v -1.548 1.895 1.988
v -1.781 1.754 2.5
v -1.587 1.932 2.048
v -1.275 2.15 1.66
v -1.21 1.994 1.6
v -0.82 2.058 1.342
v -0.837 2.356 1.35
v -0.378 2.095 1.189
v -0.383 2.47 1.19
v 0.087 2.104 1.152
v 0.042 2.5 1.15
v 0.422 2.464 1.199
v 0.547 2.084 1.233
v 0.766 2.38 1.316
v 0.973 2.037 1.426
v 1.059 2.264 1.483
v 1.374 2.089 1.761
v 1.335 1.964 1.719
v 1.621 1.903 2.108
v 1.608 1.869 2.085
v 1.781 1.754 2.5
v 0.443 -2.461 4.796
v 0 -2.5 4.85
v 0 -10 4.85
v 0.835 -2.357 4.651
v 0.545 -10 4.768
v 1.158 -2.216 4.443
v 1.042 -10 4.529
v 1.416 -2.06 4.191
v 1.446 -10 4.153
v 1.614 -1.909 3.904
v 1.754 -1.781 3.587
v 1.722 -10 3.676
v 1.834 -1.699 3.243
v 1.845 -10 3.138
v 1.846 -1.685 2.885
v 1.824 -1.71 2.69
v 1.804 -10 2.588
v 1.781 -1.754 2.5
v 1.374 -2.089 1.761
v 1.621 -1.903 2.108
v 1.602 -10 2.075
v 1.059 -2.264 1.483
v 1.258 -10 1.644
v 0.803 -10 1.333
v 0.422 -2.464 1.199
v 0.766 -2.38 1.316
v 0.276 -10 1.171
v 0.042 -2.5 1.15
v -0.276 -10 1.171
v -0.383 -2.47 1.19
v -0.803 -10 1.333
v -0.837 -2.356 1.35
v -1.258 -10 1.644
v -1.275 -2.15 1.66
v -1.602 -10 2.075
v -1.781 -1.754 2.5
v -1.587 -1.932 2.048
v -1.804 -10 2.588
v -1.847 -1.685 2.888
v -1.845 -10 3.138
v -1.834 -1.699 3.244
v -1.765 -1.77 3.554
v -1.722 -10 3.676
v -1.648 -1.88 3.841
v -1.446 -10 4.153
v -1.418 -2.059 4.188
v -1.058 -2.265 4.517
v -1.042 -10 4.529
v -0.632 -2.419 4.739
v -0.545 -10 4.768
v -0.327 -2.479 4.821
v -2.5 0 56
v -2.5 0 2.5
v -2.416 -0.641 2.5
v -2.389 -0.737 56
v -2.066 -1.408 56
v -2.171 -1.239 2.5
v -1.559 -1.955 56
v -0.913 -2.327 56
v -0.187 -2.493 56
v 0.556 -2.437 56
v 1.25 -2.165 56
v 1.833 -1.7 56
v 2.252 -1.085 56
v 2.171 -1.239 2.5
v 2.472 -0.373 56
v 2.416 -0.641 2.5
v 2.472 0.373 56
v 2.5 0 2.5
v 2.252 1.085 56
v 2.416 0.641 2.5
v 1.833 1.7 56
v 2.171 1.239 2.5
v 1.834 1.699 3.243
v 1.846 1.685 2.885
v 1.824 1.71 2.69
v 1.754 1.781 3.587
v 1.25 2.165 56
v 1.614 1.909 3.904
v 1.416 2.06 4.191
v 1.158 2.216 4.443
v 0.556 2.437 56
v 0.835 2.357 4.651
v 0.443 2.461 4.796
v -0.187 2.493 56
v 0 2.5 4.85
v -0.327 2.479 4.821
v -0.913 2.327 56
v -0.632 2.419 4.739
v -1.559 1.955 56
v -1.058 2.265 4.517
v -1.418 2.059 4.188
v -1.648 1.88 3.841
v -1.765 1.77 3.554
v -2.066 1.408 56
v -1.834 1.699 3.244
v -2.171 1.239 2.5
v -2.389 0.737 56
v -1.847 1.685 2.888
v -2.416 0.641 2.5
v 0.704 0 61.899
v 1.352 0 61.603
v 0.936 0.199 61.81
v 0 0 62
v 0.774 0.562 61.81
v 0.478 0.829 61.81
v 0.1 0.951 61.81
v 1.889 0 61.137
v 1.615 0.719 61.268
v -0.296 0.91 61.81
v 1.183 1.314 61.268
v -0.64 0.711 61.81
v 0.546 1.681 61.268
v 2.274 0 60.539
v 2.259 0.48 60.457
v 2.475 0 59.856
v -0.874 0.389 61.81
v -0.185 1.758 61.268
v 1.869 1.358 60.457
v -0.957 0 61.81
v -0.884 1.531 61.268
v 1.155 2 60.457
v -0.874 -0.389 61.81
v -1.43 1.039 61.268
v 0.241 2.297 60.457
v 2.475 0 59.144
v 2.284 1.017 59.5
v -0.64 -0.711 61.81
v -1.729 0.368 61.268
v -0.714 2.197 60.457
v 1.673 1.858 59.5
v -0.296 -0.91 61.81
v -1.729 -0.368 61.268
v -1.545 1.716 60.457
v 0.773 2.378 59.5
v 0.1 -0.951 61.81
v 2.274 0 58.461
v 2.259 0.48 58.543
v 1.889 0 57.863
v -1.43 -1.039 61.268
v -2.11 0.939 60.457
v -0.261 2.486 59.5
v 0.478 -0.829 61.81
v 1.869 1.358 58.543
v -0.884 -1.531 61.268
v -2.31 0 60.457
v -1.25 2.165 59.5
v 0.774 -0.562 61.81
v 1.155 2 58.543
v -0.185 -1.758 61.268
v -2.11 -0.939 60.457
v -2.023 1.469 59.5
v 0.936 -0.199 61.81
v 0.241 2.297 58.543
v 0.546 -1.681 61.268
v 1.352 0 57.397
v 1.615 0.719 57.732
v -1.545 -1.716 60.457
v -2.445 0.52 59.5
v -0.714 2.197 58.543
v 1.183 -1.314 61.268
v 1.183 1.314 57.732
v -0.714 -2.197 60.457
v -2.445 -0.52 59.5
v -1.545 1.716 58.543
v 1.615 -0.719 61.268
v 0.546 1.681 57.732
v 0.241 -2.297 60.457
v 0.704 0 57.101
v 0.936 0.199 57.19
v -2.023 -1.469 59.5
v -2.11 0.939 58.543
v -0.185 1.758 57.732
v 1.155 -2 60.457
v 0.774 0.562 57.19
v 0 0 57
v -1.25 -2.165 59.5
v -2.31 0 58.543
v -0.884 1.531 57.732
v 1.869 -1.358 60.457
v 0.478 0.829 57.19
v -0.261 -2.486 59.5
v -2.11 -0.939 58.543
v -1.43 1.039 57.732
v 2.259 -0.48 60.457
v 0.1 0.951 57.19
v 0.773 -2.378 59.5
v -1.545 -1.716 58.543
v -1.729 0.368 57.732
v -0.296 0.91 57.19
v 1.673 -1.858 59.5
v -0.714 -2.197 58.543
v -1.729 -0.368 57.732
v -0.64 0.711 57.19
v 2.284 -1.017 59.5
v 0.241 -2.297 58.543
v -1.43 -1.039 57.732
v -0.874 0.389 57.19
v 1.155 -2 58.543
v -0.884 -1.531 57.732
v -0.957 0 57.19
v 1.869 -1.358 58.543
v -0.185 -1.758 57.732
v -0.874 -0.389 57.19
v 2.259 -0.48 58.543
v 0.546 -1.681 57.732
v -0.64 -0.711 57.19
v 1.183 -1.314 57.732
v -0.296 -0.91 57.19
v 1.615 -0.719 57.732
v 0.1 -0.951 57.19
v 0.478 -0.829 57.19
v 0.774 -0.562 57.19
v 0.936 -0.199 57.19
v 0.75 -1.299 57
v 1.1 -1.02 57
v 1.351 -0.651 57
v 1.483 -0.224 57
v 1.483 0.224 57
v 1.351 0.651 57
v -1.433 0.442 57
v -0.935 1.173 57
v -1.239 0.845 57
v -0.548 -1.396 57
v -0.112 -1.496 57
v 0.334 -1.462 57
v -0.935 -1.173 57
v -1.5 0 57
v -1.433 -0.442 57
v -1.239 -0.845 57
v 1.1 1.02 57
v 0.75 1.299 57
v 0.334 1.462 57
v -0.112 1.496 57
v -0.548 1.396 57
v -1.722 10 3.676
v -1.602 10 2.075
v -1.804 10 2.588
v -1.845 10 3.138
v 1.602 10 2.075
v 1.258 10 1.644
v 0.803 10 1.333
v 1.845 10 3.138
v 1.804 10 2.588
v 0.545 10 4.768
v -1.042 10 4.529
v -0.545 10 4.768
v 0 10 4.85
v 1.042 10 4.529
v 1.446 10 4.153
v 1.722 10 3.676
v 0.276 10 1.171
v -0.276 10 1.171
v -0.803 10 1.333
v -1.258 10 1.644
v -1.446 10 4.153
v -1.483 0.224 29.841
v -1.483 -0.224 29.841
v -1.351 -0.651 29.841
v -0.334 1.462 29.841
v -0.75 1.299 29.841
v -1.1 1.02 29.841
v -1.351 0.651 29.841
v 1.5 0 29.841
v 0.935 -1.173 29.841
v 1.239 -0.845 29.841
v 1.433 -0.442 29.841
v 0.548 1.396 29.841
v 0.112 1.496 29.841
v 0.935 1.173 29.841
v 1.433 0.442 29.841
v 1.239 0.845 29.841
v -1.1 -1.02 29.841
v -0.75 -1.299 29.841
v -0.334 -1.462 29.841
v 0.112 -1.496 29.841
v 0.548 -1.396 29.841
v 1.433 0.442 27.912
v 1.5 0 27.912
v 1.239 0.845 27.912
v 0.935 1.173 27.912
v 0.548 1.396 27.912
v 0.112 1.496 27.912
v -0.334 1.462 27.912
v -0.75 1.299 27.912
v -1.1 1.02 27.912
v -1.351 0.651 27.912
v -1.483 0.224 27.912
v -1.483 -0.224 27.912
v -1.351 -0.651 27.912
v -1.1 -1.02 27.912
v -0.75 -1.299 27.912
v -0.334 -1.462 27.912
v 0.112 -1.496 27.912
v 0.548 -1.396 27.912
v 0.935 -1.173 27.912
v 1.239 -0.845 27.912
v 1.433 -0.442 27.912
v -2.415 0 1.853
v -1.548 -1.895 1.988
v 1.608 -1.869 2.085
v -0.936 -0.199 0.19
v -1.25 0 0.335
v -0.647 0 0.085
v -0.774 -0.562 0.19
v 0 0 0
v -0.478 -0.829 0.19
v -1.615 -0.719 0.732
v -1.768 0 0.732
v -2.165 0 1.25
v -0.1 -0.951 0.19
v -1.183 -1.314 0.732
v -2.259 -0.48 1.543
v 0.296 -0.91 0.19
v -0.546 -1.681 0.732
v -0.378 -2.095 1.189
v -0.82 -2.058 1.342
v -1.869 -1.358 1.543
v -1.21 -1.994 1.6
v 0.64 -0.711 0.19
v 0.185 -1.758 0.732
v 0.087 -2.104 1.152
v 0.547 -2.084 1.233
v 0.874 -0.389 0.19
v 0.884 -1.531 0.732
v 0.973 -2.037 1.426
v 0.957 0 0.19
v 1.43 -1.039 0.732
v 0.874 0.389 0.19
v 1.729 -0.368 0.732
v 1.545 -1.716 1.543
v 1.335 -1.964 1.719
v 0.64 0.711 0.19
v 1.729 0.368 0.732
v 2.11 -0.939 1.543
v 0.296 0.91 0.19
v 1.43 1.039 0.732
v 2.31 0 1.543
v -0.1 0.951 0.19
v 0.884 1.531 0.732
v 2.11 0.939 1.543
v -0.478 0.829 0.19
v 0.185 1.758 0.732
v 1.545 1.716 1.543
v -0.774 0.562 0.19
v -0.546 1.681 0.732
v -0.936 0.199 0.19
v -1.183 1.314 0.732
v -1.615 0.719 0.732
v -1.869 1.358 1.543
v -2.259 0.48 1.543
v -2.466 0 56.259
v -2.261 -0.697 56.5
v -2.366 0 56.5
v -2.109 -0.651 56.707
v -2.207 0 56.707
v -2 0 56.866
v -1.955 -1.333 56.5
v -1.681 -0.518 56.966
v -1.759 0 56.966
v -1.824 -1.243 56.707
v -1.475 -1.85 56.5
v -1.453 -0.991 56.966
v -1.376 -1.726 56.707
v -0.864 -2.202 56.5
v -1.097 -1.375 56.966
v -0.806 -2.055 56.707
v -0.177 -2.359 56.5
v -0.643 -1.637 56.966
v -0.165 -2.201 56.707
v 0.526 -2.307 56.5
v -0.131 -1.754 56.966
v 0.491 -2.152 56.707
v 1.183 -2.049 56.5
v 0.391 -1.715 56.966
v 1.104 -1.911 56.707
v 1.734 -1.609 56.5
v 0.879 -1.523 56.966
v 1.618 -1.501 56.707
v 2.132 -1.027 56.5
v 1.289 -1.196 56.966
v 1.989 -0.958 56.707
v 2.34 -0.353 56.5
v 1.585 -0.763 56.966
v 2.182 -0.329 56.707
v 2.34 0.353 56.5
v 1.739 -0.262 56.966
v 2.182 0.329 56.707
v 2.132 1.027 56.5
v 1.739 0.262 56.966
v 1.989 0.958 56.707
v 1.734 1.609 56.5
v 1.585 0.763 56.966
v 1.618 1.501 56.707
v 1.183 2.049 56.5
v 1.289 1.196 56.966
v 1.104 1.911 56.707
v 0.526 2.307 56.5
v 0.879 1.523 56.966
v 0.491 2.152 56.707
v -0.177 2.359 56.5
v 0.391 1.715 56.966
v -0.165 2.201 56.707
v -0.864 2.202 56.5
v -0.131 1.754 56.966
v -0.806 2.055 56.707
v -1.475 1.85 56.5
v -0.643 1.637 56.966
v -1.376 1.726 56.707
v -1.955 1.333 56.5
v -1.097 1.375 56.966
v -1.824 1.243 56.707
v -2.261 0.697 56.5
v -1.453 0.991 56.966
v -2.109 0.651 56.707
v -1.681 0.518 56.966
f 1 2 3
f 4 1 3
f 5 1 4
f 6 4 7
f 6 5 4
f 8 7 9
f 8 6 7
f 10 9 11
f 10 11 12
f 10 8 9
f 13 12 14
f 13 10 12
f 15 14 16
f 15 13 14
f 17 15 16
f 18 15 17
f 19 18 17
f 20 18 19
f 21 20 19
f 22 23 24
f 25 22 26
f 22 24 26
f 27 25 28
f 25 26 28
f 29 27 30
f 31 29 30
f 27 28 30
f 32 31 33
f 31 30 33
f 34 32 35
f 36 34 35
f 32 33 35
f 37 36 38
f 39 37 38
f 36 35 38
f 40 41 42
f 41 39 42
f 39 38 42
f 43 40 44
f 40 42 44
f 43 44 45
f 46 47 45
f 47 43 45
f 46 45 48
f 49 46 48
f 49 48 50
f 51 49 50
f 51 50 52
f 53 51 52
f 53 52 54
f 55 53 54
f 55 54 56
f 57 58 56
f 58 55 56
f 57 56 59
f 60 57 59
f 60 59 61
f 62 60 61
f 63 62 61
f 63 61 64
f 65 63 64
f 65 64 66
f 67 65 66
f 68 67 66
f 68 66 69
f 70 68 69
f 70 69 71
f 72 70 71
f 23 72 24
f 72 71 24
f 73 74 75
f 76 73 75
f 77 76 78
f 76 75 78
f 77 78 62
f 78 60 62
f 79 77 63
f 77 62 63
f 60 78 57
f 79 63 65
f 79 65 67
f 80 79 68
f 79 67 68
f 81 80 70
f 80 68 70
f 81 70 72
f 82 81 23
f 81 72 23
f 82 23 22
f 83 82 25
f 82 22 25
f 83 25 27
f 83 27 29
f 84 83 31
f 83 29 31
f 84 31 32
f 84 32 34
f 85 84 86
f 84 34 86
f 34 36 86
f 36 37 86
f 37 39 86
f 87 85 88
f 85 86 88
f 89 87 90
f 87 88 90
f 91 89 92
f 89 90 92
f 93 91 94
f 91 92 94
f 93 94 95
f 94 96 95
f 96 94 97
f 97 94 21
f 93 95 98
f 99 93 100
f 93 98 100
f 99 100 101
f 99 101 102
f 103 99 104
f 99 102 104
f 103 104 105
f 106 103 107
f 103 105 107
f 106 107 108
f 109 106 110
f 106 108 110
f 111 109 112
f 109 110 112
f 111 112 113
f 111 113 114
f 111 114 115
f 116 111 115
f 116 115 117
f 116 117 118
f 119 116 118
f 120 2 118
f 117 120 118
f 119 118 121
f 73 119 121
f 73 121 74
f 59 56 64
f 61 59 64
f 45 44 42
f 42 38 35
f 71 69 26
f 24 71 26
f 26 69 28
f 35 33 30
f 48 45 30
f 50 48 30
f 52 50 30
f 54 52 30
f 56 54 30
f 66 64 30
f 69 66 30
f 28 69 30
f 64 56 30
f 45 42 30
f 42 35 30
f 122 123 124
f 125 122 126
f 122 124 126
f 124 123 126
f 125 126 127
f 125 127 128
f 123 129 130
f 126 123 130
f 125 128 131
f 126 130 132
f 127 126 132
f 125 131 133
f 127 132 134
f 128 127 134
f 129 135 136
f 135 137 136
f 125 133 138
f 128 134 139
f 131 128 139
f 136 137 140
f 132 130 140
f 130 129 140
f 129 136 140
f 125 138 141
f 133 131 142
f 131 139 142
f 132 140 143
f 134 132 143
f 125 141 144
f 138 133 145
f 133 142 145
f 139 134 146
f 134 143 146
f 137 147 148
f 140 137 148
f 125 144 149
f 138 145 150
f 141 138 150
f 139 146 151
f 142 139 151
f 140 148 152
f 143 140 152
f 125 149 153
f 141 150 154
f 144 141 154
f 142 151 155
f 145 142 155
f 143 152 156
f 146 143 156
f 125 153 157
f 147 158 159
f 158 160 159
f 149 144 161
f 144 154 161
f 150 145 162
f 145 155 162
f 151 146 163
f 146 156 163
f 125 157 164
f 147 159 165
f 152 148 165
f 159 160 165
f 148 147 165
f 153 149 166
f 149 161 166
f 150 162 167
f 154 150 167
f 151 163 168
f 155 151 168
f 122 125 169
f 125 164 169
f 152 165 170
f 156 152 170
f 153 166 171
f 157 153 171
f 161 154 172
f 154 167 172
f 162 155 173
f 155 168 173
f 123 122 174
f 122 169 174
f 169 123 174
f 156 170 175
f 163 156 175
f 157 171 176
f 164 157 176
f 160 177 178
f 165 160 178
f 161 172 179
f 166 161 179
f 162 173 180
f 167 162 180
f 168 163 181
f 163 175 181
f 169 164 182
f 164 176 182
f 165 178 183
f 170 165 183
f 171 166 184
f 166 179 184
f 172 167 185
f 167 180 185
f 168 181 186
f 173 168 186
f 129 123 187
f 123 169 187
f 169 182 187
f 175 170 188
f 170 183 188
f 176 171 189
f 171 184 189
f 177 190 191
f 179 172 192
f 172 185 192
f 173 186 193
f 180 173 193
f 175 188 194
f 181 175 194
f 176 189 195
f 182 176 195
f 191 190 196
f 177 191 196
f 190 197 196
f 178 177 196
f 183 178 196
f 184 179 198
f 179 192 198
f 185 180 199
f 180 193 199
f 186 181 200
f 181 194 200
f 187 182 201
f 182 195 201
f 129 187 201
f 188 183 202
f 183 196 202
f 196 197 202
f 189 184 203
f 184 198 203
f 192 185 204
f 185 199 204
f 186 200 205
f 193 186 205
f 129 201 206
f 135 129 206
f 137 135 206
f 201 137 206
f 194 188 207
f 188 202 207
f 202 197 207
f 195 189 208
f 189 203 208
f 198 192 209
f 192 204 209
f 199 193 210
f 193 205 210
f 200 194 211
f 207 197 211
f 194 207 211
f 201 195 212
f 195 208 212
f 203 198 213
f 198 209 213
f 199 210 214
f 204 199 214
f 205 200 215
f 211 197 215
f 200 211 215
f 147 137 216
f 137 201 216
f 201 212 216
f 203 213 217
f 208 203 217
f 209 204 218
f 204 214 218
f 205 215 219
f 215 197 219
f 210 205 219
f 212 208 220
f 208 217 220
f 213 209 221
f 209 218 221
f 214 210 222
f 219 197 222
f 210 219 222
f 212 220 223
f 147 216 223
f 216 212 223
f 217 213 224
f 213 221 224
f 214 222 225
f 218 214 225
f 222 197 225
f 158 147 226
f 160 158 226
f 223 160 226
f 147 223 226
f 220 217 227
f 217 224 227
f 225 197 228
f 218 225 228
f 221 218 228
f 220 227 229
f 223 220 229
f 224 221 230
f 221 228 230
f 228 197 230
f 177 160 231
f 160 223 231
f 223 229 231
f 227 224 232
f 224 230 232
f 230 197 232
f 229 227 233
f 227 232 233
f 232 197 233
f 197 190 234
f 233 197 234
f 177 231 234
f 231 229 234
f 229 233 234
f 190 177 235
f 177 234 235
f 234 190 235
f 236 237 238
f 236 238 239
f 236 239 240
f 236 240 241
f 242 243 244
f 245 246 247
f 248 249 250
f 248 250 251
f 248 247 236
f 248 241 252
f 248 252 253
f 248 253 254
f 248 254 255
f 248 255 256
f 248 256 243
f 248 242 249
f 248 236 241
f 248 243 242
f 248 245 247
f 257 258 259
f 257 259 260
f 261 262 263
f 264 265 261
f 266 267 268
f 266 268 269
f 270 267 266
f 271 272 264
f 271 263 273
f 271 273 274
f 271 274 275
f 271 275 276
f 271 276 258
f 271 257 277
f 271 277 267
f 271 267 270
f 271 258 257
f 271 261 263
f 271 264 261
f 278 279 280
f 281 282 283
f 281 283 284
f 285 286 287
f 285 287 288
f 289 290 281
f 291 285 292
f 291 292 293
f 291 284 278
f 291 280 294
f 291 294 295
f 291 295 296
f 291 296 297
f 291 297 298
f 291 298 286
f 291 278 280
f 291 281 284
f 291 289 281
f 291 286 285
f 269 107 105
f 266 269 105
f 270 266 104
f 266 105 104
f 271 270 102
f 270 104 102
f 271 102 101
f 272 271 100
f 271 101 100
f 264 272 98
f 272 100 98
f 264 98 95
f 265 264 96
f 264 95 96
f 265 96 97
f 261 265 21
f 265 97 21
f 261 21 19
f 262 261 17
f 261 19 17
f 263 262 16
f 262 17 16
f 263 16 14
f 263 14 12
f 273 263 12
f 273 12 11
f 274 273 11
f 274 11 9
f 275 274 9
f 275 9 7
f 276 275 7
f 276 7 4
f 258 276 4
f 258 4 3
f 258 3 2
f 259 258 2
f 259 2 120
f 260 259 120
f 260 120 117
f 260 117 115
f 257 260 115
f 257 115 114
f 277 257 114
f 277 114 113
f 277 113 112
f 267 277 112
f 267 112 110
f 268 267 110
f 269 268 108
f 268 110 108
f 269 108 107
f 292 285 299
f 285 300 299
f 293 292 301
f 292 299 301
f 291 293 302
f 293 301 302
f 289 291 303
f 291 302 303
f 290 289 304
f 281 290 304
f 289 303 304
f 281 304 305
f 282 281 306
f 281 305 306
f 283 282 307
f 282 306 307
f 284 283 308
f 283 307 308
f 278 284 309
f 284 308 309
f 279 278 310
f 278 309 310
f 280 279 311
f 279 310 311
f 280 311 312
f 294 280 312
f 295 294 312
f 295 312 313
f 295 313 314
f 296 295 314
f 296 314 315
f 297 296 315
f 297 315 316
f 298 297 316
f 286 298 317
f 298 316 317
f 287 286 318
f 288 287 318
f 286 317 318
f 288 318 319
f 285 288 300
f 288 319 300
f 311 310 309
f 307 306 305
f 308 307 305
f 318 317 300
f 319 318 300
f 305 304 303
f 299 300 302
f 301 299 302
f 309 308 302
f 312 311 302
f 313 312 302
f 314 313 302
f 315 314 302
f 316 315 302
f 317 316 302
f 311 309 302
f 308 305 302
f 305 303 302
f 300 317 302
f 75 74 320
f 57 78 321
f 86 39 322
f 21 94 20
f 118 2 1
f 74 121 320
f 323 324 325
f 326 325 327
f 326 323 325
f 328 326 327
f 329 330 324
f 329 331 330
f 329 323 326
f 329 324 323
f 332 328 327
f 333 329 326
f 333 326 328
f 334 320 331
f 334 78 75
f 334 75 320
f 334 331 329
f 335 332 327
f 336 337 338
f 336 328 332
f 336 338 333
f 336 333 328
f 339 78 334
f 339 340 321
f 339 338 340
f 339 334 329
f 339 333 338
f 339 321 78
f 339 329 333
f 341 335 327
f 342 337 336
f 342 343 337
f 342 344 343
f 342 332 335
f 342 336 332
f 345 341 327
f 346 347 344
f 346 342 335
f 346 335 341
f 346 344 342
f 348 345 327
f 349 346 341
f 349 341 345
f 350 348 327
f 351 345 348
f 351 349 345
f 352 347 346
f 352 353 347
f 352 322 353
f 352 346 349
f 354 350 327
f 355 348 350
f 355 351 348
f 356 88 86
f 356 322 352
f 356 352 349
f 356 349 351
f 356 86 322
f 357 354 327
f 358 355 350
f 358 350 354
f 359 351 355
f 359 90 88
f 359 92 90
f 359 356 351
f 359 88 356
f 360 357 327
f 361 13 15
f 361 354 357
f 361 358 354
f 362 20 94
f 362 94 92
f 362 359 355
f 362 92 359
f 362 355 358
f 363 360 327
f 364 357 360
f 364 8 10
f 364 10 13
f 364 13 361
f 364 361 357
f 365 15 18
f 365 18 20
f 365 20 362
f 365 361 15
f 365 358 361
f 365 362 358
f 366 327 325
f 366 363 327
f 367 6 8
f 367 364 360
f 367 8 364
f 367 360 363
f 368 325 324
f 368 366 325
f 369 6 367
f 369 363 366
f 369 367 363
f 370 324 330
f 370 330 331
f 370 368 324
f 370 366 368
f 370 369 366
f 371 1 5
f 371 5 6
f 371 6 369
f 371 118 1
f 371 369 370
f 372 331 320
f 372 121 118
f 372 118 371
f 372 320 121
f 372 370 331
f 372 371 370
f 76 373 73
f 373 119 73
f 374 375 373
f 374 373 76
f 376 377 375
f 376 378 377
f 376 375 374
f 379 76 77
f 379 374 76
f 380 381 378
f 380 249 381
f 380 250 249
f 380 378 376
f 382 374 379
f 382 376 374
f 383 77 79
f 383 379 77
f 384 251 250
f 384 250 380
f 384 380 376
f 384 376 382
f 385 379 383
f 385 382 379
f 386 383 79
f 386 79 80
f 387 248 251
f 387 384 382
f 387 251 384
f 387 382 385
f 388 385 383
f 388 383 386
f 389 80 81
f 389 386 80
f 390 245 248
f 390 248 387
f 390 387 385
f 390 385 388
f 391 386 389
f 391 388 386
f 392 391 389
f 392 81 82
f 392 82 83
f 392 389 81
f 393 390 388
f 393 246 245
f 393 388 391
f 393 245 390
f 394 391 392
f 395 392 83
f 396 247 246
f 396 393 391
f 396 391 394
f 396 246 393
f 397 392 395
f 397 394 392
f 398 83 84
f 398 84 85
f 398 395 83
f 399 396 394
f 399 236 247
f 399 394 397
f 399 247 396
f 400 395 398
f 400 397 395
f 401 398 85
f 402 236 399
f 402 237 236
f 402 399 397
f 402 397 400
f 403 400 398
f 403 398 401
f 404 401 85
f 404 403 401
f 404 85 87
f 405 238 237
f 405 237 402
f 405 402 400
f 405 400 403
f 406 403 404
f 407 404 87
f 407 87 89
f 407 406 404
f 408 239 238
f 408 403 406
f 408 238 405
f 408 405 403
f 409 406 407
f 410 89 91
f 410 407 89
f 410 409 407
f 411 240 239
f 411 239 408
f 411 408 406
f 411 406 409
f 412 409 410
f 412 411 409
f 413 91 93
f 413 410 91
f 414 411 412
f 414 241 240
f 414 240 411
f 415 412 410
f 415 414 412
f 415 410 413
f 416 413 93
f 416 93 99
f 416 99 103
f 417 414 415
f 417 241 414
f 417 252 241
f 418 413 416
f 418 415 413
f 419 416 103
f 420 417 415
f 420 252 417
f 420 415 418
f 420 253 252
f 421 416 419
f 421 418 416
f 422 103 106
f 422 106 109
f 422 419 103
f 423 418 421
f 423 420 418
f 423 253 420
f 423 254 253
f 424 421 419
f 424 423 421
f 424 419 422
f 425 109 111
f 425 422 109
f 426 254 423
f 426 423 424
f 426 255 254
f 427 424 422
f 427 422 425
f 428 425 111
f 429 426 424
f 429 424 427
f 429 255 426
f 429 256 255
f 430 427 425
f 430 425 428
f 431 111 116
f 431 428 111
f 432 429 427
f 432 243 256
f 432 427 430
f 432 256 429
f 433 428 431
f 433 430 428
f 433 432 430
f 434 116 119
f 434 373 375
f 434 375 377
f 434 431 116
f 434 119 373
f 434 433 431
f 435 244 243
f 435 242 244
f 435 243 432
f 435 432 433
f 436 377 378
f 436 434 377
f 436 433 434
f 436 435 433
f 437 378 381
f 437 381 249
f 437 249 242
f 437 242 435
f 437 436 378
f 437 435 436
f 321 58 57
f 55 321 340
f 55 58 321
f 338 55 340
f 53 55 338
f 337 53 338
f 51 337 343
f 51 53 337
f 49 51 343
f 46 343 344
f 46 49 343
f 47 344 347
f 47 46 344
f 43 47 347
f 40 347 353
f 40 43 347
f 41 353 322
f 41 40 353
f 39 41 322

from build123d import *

# Parameters (mm, degrees)
SKETCH1_R                = 2.5
BOSS_EXTRUDE1_DEPTH      = 57
SKETCH3_W                = 1.5
SKETCH3_H                = 1.928249817
FILLET1_R                = 1
BOSS_EXTRUDE2_DEPTH      = 10
BOSS_EXTRUDE2_DEPTH_BACK = 10
SKETCH4_R                = 1.85
FILLET2_R                = 2.5


with BuildPart() as part:
    # Sketch1 → Boss-Extrude1 (new body)
    with BuildSketch(Plane.XY):
        with Locations(Location((0, 0, 0), (0, 0, 180))):
            Circle(SKETCH1_R)
    extrude(amount=BOSS_EXTRUDE1_DEPTH)

    # Fillet1
    fillet1_edges = [part.edges().sort_by_distance(p)[0] for p in [
        (2.5, 0, 57),
    ]]
    fillet(fillet1_edges, radius=FILLET1_R)

    # Sketch4 → Boss-Extrude2 (add, two sides: drawn at the far end of the back side and taken through both)
    with BuildSketch(Plane(origin=(0, 0, 0), x_dir=(1, 0, 0), z_dir=(0, 1, 0)).offset(-BOSS_EXTRUDE2_DEPTH_BACK)):
        with Locations(Location((0, -3, 0), (0, 0, 270))):
            Circle(SKETCH4_R)
    extrude(amount=BOSS_EXTRUDE2_DEPTH + BOSS_EXTRUDE2_DEPTH_BACK)

    # Fillet2
    # the kernel refuses this fillet: 2.5 mm, written as the material it takes off along each edge
    with BuildSketch(Plane(origin=(0, 0, 0), x_dir=(-1, 0, 0), z_dir=(0, 1, 0))) as fillet2_piece_1_section:
        with BuildLine():
            CenterArc((2.5 - FILLET2_R, FILLET2_R), FILLET2_R, 270, 90)
            Line((2.5 - FILLET2_R, 0), (2.5, 0))
            Line((2.5, 0), (2.5, FILLET2_R))
        make_face()
    fillet2_piece_1 = revolve(axis=Axis((0, 0, 0), (0, 0, 1)), mode=Mode.PRIVATE)
    fillet2_piece_1 = fillet2_piece_1 - Plane(origin=(0, 0, 3), x_dir=(0, 0, 1), z_dir=(0, -1, 0)) * Cylinder(1.85, 10, mode=Mode.PRIVATE)
    add(fillet2_piece_1, mode=Mode.SUBTRACT)


with BuildPart() as body_2:
    # Sketch3 → Revolve1 (revolve)
    with BuildSketch(Plane(origin=(0, 0, 0), x_dir=(1, 0, 0), z_dir=(0, 1, 0)), mode=Mode.PRIVATE) as revolve1_sk:
        with BuildLine():
            Line((0, -57), (0, -62))
            ThreePointArc((0, -62), (-2.5, -59.5), (0, -57))
        make_face()
        with Locations((-0.75, -28.876426737)):
            Rectangle(SKETCH3_W, SKETCH3_H)
    revolve(revolve1_sk.sketch.rotate(Axis((0, 0, 57), (0, 0, 1)), 180), axis=Axis((0, 0, 57), (0, 0, 1)))


solid = Compound([part.part, body_2.part])
